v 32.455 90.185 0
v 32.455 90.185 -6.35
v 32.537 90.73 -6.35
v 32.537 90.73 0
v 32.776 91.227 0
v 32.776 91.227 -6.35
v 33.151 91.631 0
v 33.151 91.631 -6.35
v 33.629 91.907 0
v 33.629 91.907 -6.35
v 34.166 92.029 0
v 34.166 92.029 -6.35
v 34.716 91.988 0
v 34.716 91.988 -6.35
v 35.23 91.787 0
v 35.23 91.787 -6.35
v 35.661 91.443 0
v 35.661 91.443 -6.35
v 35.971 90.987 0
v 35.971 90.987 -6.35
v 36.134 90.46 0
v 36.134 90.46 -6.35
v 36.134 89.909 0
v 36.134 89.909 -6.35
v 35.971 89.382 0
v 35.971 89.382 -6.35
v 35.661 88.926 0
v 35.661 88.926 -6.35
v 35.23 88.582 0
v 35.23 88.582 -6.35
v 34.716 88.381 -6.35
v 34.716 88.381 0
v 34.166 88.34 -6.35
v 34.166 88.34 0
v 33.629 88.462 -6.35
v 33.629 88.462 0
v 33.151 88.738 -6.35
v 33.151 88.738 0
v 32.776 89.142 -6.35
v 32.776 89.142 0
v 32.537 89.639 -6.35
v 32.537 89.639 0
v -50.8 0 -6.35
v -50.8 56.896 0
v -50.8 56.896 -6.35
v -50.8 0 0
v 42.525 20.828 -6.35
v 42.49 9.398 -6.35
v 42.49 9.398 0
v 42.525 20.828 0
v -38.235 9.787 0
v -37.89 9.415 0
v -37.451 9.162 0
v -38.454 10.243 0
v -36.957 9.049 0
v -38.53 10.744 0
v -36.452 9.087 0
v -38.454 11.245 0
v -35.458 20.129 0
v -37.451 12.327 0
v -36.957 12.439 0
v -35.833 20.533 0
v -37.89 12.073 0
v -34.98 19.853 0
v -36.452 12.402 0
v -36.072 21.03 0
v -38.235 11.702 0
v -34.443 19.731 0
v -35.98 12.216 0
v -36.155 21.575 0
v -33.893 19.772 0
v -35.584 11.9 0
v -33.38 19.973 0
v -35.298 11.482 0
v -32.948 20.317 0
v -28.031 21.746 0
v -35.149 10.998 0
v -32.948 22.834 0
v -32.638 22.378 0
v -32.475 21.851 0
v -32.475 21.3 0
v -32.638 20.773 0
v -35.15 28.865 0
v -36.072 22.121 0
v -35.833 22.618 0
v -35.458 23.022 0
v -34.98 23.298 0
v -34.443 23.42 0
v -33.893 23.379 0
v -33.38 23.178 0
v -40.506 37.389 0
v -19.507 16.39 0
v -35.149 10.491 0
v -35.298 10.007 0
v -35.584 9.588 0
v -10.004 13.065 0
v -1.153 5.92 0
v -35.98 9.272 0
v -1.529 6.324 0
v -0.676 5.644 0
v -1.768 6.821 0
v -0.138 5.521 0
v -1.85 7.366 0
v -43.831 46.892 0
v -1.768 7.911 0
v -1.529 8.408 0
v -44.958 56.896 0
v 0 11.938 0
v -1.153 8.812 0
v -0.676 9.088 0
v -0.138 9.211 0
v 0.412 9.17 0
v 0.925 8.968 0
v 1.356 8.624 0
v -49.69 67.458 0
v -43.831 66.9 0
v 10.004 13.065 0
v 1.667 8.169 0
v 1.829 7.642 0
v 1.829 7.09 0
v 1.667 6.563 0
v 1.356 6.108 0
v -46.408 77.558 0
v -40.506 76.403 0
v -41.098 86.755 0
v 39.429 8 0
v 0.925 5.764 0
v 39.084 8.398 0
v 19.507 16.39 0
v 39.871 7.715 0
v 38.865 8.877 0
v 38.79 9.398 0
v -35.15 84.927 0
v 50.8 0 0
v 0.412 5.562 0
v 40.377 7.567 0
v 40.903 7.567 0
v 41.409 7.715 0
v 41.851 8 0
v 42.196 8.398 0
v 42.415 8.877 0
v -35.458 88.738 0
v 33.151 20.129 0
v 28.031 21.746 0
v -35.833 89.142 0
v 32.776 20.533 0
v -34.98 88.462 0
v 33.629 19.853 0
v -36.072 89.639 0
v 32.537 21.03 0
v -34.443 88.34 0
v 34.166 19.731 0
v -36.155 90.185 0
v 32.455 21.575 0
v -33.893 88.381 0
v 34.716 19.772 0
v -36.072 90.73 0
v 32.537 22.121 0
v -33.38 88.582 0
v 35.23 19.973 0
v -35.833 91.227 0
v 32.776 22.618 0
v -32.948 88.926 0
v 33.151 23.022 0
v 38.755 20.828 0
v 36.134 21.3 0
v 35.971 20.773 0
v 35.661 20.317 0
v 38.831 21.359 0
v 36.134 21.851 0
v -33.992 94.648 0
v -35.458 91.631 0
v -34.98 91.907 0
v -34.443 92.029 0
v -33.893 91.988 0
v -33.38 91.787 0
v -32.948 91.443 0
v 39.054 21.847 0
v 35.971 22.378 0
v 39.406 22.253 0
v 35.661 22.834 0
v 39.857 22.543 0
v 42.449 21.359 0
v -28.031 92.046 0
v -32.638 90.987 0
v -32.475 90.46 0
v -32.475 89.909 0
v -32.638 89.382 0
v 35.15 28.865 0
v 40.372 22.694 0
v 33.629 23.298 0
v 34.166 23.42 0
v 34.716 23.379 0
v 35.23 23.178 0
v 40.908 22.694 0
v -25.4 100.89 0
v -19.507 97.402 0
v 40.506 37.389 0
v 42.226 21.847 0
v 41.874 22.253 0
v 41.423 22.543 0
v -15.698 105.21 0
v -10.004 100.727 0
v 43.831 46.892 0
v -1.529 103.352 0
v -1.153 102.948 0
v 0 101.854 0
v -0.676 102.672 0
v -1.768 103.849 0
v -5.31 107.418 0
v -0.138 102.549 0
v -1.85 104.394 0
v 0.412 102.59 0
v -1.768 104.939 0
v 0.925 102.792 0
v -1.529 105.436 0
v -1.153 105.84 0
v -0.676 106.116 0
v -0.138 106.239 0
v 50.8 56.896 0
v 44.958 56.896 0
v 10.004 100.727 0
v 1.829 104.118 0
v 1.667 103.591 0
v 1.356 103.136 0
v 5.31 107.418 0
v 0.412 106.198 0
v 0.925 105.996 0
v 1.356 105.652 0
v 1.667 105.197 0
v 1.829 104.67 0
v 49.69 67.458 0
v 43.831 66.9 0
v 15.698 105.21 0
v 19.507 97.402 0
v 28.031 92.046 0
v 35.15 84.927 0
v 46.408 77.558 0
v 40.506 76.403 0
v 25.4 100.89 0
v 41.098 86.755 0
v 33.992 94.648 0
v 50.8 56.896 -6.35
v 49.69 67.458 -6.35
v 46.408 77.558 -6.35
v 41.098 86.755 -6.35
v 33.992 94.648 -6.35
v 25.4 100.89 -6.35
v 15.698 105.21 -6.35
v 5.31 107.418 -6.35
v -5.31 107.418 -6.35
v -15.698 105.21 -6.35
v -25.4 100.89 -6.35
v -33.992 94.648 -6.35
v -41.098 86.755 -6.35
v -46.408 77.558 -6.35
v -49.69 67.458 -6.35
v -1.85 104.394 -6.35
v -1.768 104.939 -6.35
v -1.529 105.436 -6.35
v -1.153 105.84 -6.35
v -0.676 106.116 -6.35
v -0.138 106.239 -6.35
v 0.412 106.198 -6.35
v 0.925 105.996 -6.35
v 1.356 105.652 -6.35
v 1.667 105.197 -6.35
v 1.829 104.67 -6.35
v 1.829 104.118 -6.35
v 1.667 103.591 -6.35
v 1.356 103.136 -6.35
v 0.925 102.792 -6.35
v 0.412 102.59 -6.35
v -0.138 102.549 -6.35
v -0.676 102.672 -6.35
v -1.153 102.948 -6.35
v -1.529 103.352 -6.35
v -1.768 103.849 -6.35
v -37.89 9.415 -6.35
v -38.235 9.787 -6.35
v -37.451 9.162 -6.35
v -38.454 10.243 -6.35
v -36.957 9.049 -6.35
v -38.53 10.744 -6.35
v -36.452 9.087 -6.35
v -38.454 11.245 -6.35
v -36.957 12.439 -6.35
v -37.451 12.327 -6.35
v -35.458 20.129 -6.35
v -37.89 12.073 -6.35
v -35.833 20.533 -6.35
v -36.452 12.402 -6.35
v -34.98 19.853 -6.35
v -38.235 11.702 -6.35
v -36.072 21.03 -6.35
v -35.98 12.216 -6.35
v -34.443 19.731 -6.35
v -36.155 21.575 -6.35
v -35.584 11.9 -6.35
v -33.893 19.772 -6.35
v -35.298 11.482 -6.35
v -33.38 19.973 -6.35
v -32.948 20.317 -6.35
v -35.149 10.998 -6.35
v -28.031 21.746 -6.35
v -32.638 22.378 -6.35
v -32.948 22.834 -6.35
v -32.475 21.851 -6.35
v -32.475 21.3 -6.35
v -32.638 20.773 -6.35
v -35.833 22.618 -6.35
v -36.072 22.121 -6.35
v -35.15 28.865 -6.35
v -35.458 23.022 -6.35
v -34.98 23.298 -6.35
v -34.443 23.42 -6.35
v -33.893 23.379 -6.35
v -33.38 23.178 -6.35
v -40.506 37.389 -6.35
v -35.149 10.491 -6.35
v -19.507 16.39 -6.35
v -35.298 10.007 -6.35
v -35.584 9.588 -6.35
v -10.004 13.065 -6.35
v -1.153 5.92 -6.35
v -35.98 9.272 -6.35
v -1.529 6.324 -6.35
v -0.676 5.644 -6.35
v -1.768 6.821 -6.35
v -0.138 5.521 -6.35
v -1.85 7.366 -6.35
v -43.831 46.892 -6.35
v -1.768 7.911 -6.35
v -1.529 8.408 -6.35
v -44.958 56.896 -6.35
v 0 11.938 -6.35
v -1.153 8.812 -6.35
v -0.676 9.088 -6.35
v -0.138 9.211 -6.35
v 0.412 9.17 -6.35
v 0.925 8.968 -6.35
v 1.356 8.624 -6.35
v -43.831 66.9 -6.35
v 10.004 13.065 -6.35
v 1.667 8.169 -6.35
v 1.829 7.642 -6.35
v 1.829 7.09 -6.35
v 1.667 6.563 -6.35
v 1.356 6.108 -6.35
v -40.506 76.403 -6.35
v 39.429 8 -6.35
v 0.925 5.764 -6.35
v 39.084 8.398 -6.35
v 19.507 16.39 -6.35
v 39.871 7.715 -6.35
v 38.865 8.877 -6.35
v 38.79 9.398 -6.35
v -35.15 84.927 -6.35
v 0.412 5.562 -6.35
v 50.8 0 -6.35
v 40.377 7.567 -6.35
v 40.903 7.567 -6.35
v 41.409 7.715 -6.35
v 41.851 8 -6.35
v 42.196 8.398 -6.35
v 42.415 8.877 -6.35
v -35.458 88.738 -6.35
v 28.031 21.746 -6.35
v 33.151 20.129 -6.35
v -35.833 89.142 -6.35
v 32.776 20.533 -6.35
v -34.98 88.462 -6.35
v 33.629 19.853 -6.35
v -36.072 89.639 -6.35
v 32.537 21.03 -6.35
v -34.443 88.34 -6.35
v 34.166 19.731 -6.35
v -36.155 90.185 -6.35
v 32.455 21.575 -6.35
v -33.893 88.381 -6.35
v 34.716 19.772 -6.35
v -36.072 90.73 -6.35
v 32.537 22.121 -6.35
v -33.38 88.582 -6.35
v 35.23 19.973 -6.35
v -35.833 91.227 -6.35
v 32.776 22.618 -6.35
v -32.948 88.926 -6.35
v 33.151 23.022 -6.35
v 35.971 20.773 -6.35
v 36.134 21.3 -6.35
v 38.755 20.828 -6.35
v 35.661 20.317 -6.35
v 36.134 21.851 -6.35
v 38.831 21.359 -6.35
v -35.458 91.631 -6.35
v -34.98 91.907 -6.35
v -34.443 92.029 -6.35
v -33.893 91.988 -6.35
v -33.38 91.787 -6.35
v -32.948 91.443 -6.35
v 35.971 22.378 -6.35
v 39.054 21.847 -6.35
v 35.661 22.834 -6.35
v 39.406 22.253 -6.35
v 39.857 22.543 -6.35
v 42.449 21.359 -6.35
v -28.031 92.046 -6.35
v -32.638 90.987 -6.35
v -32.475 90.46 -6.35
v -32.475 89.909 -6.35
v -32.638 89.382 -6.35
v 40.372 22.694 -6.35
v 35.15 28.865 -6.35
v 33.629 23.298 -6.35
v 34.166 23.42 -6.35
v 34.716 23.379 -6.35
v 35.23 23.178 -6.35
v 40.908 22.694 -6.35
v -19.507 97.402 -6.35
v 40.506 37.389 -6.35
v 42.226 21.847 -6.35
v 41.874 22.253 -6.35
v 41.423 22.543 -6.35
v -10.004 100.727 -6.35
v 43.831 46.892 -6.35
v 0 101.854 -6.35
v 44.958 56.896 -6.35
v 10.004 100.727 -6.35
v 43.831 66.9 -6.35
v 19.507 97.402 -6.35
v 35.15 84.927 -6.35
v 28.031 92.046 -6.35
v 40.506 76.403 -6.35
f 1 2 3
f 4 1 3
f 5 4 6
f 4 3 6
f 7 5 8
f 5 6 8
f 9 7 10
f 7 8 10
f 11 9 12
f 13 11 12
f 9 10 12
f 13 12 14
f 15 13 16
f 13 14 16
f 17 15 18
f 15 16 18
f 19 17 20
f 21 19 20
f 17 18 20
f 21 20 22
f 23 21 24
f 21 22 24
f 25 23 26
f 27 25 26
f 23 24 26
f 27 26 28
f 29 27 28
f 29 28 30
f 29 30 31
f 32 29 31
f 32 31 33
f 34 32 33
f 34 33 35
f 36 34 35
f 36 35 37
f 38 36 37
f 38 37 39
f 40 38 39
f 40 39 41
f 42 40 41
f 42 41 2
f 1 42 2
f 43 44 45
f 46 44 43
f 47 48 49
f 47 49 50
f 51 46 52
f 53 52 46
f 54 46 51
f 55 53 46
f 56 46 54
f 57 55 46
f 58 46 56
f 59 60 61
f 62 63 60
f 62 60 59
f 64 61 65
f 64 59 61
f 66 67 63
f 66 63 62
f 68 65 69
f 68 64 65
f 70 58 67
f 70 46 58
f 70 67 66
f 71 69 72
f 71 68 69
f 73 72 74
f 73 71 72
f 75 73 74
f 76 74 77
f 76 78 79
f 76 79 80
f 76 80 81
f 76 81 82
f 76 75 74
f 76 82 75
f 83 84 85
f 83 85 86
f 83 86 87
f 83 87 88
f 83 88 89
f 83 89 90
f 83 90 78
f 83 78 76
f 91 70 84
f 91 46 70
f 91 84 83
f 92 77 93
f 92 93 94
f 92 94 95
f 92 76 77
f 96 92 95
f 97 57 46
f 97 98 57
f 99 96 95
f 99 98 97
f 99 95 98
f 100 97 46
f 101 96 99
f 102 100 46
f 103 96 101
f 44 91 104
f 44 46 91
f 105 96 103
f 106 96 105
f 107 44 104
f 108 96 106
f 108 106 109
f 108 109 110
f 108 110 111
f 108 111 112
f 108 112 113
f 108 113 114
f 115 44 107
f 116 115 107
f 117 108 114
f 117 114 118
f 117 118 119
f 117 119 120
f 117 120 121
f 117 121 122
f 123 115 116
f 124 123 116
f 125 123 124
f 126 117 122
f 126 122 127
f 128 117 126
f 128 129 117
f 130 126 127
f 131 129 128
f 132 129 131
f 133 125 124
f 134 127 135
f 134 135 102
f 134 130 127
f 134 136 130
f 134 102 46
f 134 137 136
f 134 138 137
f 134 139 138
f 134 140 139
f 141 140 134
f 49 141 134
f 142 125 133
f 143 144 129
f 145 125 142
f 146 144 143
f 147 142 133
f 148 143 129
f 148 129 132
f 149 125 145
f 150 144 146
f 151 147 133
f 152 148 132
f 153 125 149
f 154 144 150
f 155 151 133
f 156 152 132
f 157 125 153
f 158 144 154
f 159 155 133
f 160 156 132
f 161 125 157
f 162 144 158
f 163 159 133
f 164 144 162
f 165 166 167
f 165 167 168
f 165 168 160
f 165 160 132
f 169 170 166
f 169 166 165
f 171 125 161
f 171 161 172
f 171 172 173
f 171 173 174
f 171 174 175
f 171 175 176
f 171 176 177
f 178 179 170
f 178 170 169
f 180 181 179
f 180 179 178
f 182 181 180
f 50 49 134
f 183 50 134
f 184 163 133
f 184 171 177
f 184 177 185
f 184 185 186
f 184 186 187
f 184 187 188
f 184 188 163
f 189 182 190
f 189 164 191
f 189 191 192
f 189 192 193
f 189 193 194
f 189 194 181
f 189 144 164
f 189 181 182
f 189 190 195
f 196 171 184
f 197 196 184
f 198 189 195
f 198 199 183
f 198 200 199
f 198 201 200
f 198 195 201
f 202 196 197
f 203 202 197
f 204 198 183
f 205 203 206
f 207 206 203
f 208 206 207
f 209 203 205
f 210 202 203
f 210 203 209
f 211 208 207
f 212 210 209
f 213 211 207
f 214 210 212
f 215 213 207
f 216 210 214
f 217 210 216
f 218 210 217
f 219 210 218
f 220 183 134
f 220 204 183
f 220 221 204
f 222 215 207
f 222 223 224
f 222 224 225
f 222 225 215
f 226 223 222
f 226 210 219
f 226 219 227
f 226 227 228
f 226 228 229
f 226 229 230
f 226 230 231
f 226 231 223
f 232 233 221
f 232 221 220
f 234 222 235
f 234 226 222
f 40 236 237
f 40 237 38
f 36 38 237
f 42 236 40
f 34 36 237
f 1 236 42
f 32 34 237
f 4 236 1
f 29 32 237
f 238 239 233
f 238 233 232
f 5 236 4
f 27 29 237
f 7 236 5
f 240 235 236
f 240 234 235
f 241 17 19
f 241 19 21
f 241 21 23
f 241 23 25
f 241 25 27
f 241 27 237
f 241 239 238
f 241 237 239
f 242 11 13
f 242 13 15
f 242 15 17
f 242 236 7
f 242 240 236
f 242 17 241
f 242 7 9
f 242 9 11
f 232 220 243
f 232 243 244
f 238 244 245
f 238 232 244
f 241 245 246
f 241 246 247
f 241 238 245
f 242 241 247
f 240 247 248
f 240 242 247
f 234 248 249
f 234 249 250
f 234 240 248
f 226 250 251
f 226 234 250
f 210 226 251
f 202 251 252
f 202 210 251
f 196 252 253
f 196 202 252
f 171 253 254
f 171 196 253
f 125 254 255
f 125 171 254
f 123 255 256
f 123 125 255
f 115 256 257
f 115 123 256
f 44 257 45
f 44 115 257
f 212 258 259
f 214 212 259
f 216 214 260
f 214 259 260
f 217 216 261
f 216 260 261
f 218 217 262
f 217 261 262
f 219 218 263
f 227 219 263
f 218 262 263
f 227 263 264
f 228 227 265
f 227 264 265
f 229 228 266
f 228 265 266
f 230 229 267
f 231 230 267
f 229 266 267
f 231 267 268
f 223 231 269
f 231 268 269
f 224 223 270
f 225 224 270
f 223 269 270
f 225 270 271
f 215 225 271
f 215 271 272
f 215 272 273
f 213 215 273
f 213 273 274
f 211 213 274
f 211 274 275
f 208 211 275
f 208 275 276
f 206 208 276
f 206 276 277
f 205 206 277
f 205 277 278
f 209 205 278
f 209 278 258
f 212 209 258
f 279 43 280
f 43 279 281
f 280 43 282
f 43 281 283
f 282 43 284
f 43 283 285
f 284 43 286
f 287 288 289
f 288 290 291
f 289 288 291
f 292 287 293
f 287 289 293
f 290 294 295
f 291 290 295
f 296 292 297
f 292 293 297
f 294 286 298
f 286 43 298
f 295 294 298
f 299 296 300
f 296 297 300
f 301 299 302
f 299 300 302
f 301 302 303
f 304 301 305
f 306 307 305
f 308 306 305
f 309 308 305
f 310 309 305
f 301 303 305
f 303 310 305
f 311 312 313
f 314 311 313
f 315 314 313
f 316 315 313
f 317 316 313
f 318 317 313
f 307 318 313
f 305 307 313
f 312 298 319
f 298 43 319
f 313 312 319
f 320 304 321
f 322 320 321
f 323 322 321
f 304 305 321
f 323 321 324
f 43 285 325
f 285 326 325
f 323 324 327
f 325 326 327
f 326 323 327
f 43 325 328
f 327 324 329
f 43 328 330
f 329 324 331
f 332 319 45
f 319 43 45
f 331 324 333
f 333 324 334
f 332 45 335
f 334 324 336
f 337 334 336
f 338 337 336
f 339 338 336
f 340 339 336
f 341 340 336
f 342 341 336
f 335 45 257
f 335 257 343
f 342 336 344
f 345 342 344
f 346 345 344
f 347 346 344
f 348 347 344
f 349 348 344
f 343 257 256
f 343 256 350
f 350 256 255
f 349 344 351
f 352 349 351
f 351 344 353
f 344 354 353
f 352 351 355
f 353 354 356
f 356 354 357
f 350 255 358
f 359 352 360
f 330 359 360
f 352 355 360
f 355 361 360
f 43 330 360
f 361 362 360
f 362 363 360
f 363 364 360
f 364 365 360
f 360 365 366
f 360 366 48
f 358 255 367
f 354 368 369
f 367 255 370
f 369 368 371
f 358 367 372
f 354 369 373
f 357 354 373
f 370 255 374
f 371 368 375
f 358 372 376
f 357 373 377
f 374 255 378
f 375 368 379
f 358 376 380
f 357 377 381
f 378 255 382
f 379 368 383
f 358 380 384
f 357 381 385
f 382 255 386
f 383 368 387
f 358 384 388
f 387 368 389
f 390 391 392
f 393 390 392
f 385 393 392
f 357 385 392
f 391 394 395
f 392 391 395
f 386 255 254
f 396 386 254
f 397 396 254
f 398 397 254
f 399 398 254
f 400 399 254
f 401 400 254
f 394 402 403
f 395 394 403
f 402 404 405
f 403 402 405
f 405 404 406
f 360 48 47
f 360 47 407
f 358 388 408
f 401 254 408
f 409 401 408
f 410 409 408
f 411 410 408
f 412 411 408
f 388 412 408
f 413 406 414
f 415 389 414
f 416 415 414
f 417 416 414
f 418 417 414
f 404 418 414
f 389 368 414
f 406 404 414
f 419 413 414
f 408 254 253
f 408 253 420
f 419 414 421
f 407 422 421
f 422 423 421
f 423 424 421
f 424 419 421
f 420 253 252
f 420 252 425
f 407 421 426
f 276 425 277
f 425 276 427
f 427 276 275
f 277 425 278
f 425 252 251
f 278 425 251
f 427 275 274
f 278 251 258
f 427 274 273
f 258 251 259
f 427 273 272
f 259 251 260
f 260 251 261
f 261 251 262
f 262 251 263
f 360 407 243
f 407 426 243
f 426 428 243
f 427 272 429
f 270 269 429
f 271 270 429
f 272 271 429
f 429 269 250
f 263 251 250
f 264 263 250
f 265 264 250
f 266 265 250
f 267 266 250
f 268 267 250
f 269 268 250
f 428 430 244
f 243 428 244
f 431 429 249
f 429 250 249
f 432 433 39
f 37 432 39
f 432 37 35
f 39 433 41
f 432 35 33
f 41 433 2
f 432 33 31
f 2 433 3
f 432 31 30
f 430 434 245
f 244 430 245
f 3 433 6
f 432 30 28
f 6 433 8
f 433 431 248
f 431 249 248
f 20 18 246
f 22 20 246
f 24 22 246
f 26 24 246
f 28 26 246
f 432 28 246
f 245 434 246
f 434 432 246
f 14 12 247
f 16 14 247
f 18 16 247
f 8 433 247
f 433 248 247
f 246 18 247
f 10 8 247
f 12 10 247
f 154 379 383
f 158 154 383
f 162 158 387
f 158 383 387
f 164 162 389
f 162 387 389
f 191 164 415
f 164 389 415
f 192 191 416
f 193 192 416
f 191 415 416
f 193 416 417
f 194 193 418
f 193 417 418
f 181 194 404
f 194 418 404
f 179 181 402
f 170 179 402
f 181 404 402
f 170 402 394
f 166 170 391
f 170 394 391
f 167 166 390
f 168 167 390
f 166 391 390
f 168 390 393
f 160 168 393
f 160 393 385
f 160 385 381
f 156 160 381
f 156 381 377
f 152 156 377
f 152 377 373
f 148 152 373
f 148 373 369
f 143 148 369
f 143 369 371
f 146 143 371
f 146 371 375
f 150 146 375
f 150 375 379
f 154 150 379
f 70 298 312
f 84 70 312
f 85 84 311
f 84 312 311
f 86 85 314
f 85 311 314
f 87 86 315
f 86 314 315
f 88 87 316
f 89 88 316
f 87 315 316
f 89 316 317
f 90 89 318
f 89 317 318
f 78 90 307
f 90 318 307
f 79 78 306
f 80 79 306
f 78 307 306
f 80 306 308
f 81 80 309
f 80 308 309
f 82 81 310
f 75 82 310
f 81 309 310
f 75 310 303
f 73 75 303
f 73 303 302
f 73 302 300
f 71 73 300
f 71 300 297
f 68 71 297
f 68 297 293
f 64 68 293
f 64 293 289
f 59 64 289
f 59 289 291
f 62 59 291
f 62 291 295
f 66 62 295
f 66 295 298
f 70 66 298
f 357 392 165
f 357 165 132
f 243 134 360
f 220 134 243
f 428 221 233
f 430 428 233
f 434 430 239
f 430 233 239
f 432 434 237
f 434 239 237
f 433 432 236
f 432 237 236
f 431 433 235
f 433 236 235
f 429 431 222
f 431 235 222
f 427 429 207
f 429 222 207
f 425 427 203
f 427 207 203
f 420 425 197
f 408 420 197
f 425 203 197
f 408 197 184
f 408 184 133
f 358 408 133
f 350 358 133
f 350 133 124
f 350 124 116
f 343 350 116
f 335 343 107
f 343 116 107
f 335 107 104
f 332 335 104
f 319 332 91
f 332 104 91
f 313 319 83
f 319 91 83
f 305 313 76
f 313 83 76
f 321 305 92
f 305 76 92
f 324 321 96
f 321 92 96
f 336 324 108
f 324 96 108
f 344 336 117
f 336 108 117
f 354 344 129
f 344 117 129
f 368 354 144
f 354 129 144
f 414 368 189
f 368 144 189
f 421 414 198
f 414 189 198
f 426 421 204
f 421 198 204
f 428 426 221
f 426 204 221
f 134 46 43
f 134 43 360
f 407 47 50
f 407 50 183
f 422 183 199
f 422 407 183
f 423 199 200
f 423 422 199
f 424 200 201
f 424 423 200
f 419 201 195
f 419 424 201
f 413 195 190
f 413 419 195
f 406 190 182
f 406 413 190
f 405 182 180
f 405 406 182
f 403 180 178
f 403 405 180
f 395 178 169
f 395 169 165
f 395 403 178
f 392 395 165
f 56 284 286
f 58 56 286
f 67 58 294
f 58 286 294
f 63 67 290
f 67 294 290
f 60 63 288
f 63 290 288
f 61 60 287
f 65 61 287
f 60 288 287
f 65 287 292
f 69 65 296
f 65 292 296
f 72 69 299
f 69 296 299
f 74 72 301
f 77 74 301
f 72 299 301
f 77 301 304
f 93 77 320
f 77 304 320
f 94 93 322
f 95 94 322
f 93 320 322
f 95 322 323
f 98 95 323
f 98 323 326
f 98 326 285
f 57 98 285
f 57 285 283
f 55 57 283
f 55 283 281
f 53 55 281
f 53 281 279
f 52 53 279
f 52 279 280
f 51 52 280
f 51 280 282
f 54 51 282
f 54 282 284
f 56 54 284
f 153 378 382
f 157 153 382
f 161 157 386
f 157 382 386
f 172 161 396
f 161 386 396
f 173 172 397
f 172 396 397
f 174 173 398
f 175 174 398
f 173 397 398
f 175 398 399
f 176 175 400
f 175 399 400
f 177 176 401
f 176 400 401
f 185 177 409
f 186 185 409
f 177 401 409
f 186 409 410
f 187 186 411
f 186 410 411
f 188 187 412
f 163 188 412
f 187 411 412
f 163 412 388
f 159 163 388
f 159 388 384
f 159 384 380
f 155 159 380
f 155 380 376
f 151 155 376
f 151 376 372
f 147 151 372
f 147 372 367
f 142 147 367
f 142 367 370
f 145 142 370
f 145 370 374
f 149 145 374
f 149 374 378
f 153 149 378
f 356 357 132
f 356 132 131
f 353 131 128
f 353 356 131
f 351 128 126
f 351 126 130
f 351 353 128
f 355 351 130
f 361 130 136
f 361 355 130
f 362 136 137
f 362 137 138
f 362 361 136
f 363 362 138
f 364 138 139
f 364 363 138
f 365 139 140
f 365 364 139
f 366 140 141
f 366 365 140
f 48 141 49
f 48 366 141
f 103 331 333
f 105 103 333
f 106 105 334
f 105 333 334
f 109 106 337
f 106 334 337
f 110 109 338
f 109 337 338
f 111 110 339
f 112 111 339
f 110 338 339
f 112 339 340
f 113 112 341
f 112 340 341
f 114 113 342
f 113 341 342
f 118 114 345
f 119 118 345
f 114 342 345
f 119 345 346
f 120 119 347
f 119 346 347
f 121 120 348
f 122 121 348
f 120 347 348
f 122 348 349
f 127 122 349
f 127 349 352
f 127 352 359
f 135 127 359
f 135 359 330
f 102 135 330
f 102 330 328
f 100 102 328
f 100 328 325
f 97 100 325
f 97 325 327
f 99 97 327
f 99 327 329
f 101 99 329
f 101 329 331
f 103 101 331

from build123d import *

# Parameters (mm, degrees)
SKETCH1_R                = 44.958
BOSS_EXTRUDE1_DEPTH      = 6.35
M3_CLEARANCE_HOLE2_D     = 3.4
M3_CLEARANCE_HOLE2_DEPTH = 25.4
M3_CLEARANCE_HOLE2_TIP   = 1.021463052
M3_CLEARANCE_HOLE3_D     = 3.7
M3_CLEARANCE_HOLE3_DEPTH = 25.4
M3_CLEARANCE_HOLE3_TIP   = 1.111592145
CUT_EXTRUDE1_START       = -6.35
CUT_EXTRUDE1_DEPTH       = 6.35


# Read off the part's stored shape, not the designer's step: Cut-Extrude1
with BuildPart() as part:
    # Sketch1 → Boss-Extrude1 (new body)
    with BuildSketch(Plane.XY):
        with BuildLine():
            Line((50.8, 0), (50.8, 56.896))
            ThreePointArc((50.8, 56.896), (0, 107.696), (-50.8, 56.896))
            Line((-50.8, 56.896), (-50.8, 0))
            Line((-50.8, 0), (50.8, 0))
        make_face()
        with Locations((0, 56.896)):
            Circle(SKETCH1_R, mode=Mode.SUBTRACT)
    extrude(amount=-BOSS_EXTRUDE1_DEPTH)

    # M3 Clearance Hole2
    with Locations(Plane.XY):
        with Locations((-36.83, 10.7442)):
            Hole(M3_CLEARANCE_HOLE2_D / 2, depth=M3_CLEARANCE_HOLE2_DEPTH)
            with Locations((0, 0, -(M3_CLEARANCE_HOLE2_DEPTH + M3_CLEARANCE_HOLE2_TIP / 2))):  # 118° drill point
                Cone(0, M3_CLEARANCE_HOLE2_D / 2, M3_CLEARANCE_HOLE2_TIP, mode=Mode.SUBTRACT)

    # M3 Clearance Hole3
    with Locations(Plane.XY):
        with Locations((0, 104.394), (34.304578382, 90.184578382), (34.304578383, 21.575421618), (0, 7.366), (-34.304578382, 21.575421618), (-34.304578382, 90.184578382)):
            Hole(M3_CLEARANCE_HOLE3_D / 2, depth=M3_CLEARANCE_HOLE3_DEPTH)
            with Locations((0, 0, -(M3_CLEARANCE_HOLE3_DEPTH + M3_CLEARANCE_HOLE3_TIP / 2))):  # 118° drill point
                Cone(0, M3_CLEARANCE_HOLE3_D / 2, M3_CLEARANCE_HOLE3_TIP, mode=Mode.SUBTRACT)

    # Cut-Extrude1 outline → Cut-Extrude1 (cut)
    with BuildSketch(Plane.XY.offset(CUT_EXTRUDE1_START)):
        with BuildLine():
            Line((42.49, 9.398), (42.525, 20.828))
            ThreePointArc((42.525, 20.828), (40.64, 22.713), (38.755, 20.828))
            Line((38.755, 20.828), (38.79, 9.398))
            ThreePointArc((38.79, 9.398), (40.64, 7.548), (42.49, 9.398))
        make_face()
    extrude(amount=CUT_EXTRUDE1_DEPTH, mode=Mode.SUBTRACT)


solid = part.part
